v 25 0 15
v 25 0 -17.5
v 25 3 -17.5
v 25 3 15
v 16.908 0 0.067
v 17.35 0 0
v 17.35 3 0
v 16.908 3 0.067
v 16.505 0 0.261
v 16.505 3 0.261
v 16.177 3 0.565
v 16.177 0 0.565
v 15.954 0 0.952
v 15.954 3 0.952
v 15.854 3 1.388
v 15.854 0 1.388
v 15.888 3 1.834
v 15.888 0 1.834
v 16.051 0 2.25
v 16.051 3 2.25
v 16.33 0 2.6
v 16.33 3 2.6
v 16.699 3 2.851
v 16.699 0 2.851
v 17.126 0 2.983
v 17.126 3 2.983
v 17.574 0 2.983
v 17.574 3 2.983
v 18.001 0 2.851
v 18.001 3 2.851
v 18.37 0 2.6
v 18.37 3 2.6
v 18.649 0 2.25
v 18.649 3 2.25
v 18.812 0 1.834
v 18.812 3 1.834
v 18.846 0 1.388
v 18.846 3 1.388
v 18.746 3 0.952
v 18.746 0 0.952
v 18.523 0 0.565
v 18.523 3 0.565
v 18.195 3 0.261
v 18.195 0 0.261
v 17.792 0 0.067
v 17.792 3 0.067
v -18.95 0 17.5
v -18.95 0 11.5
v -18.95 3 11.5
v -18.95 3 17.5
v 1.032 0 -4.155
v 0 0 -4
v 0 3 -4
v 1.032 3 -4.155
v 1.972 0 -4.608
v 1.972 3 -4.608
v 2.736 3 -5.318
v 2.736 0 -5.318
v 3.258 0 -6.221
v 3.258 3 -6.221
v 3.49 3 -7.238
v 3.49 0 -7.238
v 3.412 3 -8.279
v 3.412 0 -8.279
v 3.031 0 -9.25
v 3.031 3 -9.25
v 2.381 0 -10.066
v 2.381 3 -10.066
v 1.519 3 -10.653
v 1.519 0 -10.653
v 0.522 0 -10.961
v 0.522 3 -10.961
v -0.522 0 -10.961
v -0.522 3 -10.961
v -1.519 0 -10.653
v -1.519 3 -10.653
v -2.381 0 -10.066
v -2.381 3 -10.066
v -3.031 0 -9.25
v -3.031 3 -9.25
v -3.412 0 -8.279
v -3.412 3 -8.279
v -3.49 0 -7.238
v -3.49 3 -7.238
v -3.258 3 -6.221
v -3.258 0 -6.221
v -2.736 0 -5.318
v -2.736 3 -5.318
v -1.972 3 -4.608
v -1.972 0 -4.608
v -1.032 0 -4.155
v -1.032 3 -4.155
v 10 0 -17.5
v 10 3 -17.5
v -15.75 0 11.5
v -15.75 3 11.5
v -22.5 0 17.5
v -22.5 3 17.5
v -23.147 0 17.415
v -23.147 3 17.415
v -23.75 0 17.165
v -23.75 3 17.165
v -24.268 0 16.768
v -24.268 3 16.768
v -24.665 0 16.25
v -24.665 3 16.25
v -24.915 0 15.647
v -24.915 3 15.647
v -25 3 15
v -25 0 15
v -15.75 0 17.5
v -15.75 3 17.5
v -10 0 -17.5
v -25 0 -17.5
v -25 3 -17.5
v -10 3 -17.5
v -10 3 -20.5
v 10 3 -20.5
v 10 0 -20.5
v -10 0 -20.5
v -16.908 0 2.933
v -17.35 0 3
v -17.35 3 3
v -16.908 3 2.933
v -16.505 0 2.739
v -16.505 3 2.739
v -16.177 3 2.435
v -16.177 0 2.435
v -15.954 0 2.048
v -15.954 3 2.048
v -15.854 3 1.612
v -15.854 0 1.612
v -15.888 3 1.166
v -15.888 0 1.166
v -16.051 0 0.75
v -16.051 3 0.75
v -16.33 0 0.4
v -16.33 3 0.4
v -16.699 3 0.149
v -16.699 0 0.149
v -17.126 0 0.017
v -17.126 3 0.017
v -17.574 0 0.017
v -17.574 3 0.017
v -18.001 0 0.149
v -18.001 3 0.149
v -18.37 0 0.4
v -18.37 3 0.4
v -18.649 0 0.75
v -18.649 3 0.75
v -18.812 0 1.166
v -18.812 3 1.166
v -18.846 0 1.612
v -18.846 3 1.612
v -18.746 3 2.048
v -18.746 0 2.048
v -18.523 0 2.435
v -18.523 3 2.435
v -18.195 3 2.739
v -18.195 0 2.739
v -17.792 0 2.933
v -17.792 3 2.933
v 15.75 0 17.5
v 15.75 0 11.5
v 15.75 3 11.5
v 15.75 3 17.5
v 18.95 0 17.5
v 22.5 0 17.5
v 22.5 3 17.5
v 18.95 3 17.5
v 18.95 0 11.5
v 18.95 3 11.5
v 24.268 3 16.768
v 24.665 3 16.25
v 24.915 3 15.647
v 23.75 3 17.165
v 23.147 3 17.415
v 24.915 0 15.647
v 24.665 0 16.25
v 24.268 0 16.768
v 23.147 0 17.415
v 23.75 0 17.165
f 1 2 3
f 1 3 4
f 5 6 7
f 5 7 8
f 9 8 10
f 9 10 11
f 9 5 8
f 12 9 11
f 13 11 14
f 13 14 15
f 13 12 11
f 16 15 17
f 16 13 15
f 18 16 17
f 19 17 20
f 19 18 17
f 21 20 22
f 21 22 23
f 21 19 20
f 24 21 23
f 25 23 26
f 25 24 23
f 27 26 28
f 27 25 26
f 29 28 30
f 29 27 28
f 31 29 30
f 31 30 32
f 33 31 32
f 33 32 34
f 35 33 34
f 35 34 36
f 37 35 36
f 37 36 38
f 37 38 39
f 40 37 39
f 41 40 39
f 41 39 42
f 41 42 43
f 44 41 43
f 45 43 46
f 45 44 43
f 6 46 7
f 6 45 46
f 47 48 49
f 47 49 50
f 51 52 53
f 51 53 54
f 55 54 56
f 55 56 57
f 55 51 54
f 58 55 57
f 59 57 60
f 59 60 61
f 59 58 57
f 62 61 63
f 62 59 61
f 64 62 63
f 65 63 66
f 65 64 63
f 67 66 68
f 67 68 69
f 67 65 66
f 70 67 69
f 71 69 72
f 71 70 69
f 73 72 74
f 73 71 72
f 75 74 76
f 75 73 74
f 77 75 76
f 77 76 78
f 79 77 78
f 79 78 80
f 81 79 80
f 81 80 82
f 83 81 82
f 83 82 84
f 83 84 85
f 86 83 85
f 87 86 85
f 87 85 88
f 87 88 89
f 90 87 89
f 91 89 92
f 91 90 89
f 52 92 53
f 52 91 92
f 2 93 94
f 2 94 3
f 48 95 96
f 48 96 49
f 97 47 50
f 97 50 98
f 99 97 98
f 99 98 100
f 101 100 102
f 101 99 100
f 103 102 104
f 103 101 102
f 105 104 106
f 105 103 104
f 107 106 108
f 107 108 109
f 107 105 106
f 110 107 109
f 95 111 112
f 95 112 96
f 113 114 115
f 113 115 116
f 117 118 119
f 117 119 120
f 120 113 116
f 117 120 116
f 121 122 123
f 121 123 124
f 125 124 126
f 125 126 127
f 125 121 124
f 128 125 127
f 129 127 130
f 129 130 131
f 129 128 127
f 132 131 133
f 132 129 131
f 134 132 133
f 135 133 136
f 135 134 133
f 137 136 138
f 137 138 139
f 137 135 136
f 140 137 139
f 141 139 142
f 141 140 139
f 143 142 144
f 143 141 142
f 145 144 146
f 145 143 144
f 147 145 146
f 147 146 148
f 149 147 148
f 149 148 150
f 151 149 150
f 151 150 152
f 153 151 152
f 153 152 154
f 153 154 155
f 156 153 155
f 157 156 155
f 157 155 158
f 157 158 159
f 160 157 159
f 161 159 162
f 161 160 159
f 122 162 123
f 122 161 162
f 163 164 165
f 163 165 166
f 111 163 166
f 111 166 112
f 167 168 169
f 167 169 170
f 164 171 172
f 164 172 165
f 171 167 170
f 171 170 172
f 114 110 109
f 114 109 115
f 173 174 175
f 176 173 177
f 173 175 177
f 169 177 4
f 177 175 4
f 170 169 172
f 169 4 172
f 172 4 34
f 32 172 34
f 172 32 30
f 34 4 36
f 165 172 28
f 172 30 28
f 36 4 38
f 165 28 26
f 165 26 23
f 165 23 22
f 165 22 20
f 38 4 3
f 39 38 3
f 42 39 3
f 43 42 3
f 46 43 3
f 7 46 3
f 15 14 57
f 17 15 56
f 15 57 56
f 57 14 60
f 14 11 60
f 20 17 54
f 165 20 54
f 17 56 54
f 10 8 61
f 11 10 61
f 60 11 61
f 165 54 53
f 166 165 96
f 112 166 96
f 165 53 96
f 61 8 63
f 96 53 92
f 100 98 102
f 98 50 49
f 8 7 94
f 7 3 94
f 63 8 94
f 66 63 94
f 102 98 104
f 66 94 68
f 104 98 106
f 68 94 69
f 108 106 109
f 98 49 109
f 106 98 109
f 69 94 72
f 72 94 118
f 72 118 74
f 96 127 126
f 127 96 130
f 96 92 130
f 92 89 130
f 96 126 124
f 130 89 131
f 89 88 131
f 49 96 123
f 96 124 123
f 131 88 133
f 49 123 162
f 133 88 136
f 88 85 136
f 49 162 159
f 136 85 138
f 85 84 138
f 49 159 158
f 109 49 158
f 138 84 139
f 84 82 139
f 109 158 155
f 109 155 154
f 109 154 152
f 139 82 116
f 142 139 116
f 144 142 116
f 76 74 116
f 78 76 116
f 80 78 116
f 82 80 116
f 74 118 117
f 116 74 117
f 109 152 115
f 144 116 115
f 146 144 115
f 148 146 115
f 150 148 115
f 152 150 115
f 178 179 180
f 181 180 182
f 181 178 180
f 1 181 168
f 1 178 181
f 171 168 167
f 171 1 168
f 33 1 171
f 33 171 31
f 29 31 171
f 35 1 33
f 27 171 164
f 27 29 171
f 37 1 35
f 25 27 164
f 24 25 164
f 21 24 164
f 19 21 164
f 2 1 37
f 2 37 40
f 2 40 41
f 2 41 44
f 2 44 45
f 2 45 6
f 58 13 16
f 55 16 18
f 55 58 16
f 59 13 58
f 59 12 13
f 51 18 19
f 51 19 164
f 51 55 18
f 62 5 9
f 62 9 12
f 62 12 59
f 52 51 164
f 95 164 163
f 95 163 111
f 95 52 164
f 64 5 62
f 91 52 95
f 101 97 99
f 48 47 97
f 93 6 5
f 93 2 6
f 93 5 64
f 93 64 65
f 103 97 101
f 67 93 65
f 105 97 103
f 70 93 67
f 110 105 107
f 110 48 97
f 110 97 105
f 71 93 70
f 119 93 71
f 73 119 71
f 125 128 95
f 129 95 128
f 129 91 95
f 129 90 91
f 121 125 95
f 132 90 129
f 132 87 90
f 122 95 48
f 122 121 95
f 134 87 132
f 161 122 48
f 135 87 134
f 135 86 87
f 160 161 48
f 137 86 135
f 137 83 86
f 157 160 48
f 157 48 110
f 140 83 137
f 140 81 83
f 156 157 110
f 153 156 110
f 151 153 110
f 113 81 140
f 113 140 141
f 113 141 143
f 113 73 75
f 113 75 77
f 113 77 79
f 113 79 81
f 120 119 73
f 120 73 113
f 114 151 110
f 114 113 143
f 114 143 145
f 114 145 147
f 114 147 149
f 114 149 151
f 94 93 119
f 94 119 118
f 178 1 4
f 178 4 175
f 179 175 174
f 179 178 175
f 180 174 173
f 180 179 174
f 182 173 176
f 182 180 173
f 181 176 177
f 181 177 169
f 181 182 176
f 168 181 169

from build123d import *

# Parameters (mm, degrees)
CROQUIS1_R              = 1.5
CROQUIS1_R_2            = 3.5
SALIENTE_EXTRUIR1_DEPTH = 3
CROQUIS4_W              = 20
CROQUIS4_H              = 3
SALIENTE_EXTRUIR2_DEPTH = 3


with BuildPart() as part:
    # Croquis1 → Saliente-Extruir1 (new body)
    with BuildSketch(Plane(origin=(0, 0, 0), x_dir=(1, 0, 0), z_dir=(0, 1, 0))):
        with BuildLine():
            Line((22.5, -17.5), (18.95, -17.5))
            Line((18.95, -17.5), (18.95, -11.5))
            Line((18.95, -11.5), (15.75, -11.5))
            Line((15.75, -11.5), (15.75, -17.5))
            Line((15.75, -17.5), (-15.75, -17.5))
            Line((-15.75, -17.5), (-15.75, -11.5))
            Line((-15.75, -11.5), (-18.95, -11.5))
            Line((-18.95, -11.5), (-18.95, -17.5))
            Line((-18.95, -17.5), (-22.5, -17.5))
            ThreePointArc((-22.5, -17.5), (-24.267766953, -16.767766953), (-25, -15))
            Line((-25, -15), (-25, 17.5))
            Line((-25, 17.5), (25, 17.5))
            Line((25, 17.5), (25, -15))
            ThreePointArc((25, -15), (24.267766953, -16.767766953), (22.5, -17.5))
        make_face()
        with Locations(Location((-17.35, -1.5, 0), (0, 0, 270))):
            Circle(CROQUIS1_R, mode=Mode.SUBTRACT)
        with Locations(Location((17.35, -1.5, 0), (0, 0, 90))):
            Circle(CROQUIS1_R, mode=Mode.SUBTRACT)
        with Locations(Location((0, 7.5, 0), (0, 0, 270))):
            Circle(CROQUIS1_R_2, mode=Mode.SUBTRACT)
    extrude(amount=SALIENTE_EXTRUIR1_DEPTH)

    # Croquis4 → Saliente-Extruir2 (add)
    with BuildSketch(Plane(origin=(0, 0, -17.5), x_dir=(-1, 0, 0), z_dir=(0, 0, -1))):
        with Locations((0, 1.5)):
            Rectangle(CROQUIS4_W, CROQUIS4_H)
    extrude(amount=SALIENTE_EXTRUIR2_DEPTH)


solid = part.part
